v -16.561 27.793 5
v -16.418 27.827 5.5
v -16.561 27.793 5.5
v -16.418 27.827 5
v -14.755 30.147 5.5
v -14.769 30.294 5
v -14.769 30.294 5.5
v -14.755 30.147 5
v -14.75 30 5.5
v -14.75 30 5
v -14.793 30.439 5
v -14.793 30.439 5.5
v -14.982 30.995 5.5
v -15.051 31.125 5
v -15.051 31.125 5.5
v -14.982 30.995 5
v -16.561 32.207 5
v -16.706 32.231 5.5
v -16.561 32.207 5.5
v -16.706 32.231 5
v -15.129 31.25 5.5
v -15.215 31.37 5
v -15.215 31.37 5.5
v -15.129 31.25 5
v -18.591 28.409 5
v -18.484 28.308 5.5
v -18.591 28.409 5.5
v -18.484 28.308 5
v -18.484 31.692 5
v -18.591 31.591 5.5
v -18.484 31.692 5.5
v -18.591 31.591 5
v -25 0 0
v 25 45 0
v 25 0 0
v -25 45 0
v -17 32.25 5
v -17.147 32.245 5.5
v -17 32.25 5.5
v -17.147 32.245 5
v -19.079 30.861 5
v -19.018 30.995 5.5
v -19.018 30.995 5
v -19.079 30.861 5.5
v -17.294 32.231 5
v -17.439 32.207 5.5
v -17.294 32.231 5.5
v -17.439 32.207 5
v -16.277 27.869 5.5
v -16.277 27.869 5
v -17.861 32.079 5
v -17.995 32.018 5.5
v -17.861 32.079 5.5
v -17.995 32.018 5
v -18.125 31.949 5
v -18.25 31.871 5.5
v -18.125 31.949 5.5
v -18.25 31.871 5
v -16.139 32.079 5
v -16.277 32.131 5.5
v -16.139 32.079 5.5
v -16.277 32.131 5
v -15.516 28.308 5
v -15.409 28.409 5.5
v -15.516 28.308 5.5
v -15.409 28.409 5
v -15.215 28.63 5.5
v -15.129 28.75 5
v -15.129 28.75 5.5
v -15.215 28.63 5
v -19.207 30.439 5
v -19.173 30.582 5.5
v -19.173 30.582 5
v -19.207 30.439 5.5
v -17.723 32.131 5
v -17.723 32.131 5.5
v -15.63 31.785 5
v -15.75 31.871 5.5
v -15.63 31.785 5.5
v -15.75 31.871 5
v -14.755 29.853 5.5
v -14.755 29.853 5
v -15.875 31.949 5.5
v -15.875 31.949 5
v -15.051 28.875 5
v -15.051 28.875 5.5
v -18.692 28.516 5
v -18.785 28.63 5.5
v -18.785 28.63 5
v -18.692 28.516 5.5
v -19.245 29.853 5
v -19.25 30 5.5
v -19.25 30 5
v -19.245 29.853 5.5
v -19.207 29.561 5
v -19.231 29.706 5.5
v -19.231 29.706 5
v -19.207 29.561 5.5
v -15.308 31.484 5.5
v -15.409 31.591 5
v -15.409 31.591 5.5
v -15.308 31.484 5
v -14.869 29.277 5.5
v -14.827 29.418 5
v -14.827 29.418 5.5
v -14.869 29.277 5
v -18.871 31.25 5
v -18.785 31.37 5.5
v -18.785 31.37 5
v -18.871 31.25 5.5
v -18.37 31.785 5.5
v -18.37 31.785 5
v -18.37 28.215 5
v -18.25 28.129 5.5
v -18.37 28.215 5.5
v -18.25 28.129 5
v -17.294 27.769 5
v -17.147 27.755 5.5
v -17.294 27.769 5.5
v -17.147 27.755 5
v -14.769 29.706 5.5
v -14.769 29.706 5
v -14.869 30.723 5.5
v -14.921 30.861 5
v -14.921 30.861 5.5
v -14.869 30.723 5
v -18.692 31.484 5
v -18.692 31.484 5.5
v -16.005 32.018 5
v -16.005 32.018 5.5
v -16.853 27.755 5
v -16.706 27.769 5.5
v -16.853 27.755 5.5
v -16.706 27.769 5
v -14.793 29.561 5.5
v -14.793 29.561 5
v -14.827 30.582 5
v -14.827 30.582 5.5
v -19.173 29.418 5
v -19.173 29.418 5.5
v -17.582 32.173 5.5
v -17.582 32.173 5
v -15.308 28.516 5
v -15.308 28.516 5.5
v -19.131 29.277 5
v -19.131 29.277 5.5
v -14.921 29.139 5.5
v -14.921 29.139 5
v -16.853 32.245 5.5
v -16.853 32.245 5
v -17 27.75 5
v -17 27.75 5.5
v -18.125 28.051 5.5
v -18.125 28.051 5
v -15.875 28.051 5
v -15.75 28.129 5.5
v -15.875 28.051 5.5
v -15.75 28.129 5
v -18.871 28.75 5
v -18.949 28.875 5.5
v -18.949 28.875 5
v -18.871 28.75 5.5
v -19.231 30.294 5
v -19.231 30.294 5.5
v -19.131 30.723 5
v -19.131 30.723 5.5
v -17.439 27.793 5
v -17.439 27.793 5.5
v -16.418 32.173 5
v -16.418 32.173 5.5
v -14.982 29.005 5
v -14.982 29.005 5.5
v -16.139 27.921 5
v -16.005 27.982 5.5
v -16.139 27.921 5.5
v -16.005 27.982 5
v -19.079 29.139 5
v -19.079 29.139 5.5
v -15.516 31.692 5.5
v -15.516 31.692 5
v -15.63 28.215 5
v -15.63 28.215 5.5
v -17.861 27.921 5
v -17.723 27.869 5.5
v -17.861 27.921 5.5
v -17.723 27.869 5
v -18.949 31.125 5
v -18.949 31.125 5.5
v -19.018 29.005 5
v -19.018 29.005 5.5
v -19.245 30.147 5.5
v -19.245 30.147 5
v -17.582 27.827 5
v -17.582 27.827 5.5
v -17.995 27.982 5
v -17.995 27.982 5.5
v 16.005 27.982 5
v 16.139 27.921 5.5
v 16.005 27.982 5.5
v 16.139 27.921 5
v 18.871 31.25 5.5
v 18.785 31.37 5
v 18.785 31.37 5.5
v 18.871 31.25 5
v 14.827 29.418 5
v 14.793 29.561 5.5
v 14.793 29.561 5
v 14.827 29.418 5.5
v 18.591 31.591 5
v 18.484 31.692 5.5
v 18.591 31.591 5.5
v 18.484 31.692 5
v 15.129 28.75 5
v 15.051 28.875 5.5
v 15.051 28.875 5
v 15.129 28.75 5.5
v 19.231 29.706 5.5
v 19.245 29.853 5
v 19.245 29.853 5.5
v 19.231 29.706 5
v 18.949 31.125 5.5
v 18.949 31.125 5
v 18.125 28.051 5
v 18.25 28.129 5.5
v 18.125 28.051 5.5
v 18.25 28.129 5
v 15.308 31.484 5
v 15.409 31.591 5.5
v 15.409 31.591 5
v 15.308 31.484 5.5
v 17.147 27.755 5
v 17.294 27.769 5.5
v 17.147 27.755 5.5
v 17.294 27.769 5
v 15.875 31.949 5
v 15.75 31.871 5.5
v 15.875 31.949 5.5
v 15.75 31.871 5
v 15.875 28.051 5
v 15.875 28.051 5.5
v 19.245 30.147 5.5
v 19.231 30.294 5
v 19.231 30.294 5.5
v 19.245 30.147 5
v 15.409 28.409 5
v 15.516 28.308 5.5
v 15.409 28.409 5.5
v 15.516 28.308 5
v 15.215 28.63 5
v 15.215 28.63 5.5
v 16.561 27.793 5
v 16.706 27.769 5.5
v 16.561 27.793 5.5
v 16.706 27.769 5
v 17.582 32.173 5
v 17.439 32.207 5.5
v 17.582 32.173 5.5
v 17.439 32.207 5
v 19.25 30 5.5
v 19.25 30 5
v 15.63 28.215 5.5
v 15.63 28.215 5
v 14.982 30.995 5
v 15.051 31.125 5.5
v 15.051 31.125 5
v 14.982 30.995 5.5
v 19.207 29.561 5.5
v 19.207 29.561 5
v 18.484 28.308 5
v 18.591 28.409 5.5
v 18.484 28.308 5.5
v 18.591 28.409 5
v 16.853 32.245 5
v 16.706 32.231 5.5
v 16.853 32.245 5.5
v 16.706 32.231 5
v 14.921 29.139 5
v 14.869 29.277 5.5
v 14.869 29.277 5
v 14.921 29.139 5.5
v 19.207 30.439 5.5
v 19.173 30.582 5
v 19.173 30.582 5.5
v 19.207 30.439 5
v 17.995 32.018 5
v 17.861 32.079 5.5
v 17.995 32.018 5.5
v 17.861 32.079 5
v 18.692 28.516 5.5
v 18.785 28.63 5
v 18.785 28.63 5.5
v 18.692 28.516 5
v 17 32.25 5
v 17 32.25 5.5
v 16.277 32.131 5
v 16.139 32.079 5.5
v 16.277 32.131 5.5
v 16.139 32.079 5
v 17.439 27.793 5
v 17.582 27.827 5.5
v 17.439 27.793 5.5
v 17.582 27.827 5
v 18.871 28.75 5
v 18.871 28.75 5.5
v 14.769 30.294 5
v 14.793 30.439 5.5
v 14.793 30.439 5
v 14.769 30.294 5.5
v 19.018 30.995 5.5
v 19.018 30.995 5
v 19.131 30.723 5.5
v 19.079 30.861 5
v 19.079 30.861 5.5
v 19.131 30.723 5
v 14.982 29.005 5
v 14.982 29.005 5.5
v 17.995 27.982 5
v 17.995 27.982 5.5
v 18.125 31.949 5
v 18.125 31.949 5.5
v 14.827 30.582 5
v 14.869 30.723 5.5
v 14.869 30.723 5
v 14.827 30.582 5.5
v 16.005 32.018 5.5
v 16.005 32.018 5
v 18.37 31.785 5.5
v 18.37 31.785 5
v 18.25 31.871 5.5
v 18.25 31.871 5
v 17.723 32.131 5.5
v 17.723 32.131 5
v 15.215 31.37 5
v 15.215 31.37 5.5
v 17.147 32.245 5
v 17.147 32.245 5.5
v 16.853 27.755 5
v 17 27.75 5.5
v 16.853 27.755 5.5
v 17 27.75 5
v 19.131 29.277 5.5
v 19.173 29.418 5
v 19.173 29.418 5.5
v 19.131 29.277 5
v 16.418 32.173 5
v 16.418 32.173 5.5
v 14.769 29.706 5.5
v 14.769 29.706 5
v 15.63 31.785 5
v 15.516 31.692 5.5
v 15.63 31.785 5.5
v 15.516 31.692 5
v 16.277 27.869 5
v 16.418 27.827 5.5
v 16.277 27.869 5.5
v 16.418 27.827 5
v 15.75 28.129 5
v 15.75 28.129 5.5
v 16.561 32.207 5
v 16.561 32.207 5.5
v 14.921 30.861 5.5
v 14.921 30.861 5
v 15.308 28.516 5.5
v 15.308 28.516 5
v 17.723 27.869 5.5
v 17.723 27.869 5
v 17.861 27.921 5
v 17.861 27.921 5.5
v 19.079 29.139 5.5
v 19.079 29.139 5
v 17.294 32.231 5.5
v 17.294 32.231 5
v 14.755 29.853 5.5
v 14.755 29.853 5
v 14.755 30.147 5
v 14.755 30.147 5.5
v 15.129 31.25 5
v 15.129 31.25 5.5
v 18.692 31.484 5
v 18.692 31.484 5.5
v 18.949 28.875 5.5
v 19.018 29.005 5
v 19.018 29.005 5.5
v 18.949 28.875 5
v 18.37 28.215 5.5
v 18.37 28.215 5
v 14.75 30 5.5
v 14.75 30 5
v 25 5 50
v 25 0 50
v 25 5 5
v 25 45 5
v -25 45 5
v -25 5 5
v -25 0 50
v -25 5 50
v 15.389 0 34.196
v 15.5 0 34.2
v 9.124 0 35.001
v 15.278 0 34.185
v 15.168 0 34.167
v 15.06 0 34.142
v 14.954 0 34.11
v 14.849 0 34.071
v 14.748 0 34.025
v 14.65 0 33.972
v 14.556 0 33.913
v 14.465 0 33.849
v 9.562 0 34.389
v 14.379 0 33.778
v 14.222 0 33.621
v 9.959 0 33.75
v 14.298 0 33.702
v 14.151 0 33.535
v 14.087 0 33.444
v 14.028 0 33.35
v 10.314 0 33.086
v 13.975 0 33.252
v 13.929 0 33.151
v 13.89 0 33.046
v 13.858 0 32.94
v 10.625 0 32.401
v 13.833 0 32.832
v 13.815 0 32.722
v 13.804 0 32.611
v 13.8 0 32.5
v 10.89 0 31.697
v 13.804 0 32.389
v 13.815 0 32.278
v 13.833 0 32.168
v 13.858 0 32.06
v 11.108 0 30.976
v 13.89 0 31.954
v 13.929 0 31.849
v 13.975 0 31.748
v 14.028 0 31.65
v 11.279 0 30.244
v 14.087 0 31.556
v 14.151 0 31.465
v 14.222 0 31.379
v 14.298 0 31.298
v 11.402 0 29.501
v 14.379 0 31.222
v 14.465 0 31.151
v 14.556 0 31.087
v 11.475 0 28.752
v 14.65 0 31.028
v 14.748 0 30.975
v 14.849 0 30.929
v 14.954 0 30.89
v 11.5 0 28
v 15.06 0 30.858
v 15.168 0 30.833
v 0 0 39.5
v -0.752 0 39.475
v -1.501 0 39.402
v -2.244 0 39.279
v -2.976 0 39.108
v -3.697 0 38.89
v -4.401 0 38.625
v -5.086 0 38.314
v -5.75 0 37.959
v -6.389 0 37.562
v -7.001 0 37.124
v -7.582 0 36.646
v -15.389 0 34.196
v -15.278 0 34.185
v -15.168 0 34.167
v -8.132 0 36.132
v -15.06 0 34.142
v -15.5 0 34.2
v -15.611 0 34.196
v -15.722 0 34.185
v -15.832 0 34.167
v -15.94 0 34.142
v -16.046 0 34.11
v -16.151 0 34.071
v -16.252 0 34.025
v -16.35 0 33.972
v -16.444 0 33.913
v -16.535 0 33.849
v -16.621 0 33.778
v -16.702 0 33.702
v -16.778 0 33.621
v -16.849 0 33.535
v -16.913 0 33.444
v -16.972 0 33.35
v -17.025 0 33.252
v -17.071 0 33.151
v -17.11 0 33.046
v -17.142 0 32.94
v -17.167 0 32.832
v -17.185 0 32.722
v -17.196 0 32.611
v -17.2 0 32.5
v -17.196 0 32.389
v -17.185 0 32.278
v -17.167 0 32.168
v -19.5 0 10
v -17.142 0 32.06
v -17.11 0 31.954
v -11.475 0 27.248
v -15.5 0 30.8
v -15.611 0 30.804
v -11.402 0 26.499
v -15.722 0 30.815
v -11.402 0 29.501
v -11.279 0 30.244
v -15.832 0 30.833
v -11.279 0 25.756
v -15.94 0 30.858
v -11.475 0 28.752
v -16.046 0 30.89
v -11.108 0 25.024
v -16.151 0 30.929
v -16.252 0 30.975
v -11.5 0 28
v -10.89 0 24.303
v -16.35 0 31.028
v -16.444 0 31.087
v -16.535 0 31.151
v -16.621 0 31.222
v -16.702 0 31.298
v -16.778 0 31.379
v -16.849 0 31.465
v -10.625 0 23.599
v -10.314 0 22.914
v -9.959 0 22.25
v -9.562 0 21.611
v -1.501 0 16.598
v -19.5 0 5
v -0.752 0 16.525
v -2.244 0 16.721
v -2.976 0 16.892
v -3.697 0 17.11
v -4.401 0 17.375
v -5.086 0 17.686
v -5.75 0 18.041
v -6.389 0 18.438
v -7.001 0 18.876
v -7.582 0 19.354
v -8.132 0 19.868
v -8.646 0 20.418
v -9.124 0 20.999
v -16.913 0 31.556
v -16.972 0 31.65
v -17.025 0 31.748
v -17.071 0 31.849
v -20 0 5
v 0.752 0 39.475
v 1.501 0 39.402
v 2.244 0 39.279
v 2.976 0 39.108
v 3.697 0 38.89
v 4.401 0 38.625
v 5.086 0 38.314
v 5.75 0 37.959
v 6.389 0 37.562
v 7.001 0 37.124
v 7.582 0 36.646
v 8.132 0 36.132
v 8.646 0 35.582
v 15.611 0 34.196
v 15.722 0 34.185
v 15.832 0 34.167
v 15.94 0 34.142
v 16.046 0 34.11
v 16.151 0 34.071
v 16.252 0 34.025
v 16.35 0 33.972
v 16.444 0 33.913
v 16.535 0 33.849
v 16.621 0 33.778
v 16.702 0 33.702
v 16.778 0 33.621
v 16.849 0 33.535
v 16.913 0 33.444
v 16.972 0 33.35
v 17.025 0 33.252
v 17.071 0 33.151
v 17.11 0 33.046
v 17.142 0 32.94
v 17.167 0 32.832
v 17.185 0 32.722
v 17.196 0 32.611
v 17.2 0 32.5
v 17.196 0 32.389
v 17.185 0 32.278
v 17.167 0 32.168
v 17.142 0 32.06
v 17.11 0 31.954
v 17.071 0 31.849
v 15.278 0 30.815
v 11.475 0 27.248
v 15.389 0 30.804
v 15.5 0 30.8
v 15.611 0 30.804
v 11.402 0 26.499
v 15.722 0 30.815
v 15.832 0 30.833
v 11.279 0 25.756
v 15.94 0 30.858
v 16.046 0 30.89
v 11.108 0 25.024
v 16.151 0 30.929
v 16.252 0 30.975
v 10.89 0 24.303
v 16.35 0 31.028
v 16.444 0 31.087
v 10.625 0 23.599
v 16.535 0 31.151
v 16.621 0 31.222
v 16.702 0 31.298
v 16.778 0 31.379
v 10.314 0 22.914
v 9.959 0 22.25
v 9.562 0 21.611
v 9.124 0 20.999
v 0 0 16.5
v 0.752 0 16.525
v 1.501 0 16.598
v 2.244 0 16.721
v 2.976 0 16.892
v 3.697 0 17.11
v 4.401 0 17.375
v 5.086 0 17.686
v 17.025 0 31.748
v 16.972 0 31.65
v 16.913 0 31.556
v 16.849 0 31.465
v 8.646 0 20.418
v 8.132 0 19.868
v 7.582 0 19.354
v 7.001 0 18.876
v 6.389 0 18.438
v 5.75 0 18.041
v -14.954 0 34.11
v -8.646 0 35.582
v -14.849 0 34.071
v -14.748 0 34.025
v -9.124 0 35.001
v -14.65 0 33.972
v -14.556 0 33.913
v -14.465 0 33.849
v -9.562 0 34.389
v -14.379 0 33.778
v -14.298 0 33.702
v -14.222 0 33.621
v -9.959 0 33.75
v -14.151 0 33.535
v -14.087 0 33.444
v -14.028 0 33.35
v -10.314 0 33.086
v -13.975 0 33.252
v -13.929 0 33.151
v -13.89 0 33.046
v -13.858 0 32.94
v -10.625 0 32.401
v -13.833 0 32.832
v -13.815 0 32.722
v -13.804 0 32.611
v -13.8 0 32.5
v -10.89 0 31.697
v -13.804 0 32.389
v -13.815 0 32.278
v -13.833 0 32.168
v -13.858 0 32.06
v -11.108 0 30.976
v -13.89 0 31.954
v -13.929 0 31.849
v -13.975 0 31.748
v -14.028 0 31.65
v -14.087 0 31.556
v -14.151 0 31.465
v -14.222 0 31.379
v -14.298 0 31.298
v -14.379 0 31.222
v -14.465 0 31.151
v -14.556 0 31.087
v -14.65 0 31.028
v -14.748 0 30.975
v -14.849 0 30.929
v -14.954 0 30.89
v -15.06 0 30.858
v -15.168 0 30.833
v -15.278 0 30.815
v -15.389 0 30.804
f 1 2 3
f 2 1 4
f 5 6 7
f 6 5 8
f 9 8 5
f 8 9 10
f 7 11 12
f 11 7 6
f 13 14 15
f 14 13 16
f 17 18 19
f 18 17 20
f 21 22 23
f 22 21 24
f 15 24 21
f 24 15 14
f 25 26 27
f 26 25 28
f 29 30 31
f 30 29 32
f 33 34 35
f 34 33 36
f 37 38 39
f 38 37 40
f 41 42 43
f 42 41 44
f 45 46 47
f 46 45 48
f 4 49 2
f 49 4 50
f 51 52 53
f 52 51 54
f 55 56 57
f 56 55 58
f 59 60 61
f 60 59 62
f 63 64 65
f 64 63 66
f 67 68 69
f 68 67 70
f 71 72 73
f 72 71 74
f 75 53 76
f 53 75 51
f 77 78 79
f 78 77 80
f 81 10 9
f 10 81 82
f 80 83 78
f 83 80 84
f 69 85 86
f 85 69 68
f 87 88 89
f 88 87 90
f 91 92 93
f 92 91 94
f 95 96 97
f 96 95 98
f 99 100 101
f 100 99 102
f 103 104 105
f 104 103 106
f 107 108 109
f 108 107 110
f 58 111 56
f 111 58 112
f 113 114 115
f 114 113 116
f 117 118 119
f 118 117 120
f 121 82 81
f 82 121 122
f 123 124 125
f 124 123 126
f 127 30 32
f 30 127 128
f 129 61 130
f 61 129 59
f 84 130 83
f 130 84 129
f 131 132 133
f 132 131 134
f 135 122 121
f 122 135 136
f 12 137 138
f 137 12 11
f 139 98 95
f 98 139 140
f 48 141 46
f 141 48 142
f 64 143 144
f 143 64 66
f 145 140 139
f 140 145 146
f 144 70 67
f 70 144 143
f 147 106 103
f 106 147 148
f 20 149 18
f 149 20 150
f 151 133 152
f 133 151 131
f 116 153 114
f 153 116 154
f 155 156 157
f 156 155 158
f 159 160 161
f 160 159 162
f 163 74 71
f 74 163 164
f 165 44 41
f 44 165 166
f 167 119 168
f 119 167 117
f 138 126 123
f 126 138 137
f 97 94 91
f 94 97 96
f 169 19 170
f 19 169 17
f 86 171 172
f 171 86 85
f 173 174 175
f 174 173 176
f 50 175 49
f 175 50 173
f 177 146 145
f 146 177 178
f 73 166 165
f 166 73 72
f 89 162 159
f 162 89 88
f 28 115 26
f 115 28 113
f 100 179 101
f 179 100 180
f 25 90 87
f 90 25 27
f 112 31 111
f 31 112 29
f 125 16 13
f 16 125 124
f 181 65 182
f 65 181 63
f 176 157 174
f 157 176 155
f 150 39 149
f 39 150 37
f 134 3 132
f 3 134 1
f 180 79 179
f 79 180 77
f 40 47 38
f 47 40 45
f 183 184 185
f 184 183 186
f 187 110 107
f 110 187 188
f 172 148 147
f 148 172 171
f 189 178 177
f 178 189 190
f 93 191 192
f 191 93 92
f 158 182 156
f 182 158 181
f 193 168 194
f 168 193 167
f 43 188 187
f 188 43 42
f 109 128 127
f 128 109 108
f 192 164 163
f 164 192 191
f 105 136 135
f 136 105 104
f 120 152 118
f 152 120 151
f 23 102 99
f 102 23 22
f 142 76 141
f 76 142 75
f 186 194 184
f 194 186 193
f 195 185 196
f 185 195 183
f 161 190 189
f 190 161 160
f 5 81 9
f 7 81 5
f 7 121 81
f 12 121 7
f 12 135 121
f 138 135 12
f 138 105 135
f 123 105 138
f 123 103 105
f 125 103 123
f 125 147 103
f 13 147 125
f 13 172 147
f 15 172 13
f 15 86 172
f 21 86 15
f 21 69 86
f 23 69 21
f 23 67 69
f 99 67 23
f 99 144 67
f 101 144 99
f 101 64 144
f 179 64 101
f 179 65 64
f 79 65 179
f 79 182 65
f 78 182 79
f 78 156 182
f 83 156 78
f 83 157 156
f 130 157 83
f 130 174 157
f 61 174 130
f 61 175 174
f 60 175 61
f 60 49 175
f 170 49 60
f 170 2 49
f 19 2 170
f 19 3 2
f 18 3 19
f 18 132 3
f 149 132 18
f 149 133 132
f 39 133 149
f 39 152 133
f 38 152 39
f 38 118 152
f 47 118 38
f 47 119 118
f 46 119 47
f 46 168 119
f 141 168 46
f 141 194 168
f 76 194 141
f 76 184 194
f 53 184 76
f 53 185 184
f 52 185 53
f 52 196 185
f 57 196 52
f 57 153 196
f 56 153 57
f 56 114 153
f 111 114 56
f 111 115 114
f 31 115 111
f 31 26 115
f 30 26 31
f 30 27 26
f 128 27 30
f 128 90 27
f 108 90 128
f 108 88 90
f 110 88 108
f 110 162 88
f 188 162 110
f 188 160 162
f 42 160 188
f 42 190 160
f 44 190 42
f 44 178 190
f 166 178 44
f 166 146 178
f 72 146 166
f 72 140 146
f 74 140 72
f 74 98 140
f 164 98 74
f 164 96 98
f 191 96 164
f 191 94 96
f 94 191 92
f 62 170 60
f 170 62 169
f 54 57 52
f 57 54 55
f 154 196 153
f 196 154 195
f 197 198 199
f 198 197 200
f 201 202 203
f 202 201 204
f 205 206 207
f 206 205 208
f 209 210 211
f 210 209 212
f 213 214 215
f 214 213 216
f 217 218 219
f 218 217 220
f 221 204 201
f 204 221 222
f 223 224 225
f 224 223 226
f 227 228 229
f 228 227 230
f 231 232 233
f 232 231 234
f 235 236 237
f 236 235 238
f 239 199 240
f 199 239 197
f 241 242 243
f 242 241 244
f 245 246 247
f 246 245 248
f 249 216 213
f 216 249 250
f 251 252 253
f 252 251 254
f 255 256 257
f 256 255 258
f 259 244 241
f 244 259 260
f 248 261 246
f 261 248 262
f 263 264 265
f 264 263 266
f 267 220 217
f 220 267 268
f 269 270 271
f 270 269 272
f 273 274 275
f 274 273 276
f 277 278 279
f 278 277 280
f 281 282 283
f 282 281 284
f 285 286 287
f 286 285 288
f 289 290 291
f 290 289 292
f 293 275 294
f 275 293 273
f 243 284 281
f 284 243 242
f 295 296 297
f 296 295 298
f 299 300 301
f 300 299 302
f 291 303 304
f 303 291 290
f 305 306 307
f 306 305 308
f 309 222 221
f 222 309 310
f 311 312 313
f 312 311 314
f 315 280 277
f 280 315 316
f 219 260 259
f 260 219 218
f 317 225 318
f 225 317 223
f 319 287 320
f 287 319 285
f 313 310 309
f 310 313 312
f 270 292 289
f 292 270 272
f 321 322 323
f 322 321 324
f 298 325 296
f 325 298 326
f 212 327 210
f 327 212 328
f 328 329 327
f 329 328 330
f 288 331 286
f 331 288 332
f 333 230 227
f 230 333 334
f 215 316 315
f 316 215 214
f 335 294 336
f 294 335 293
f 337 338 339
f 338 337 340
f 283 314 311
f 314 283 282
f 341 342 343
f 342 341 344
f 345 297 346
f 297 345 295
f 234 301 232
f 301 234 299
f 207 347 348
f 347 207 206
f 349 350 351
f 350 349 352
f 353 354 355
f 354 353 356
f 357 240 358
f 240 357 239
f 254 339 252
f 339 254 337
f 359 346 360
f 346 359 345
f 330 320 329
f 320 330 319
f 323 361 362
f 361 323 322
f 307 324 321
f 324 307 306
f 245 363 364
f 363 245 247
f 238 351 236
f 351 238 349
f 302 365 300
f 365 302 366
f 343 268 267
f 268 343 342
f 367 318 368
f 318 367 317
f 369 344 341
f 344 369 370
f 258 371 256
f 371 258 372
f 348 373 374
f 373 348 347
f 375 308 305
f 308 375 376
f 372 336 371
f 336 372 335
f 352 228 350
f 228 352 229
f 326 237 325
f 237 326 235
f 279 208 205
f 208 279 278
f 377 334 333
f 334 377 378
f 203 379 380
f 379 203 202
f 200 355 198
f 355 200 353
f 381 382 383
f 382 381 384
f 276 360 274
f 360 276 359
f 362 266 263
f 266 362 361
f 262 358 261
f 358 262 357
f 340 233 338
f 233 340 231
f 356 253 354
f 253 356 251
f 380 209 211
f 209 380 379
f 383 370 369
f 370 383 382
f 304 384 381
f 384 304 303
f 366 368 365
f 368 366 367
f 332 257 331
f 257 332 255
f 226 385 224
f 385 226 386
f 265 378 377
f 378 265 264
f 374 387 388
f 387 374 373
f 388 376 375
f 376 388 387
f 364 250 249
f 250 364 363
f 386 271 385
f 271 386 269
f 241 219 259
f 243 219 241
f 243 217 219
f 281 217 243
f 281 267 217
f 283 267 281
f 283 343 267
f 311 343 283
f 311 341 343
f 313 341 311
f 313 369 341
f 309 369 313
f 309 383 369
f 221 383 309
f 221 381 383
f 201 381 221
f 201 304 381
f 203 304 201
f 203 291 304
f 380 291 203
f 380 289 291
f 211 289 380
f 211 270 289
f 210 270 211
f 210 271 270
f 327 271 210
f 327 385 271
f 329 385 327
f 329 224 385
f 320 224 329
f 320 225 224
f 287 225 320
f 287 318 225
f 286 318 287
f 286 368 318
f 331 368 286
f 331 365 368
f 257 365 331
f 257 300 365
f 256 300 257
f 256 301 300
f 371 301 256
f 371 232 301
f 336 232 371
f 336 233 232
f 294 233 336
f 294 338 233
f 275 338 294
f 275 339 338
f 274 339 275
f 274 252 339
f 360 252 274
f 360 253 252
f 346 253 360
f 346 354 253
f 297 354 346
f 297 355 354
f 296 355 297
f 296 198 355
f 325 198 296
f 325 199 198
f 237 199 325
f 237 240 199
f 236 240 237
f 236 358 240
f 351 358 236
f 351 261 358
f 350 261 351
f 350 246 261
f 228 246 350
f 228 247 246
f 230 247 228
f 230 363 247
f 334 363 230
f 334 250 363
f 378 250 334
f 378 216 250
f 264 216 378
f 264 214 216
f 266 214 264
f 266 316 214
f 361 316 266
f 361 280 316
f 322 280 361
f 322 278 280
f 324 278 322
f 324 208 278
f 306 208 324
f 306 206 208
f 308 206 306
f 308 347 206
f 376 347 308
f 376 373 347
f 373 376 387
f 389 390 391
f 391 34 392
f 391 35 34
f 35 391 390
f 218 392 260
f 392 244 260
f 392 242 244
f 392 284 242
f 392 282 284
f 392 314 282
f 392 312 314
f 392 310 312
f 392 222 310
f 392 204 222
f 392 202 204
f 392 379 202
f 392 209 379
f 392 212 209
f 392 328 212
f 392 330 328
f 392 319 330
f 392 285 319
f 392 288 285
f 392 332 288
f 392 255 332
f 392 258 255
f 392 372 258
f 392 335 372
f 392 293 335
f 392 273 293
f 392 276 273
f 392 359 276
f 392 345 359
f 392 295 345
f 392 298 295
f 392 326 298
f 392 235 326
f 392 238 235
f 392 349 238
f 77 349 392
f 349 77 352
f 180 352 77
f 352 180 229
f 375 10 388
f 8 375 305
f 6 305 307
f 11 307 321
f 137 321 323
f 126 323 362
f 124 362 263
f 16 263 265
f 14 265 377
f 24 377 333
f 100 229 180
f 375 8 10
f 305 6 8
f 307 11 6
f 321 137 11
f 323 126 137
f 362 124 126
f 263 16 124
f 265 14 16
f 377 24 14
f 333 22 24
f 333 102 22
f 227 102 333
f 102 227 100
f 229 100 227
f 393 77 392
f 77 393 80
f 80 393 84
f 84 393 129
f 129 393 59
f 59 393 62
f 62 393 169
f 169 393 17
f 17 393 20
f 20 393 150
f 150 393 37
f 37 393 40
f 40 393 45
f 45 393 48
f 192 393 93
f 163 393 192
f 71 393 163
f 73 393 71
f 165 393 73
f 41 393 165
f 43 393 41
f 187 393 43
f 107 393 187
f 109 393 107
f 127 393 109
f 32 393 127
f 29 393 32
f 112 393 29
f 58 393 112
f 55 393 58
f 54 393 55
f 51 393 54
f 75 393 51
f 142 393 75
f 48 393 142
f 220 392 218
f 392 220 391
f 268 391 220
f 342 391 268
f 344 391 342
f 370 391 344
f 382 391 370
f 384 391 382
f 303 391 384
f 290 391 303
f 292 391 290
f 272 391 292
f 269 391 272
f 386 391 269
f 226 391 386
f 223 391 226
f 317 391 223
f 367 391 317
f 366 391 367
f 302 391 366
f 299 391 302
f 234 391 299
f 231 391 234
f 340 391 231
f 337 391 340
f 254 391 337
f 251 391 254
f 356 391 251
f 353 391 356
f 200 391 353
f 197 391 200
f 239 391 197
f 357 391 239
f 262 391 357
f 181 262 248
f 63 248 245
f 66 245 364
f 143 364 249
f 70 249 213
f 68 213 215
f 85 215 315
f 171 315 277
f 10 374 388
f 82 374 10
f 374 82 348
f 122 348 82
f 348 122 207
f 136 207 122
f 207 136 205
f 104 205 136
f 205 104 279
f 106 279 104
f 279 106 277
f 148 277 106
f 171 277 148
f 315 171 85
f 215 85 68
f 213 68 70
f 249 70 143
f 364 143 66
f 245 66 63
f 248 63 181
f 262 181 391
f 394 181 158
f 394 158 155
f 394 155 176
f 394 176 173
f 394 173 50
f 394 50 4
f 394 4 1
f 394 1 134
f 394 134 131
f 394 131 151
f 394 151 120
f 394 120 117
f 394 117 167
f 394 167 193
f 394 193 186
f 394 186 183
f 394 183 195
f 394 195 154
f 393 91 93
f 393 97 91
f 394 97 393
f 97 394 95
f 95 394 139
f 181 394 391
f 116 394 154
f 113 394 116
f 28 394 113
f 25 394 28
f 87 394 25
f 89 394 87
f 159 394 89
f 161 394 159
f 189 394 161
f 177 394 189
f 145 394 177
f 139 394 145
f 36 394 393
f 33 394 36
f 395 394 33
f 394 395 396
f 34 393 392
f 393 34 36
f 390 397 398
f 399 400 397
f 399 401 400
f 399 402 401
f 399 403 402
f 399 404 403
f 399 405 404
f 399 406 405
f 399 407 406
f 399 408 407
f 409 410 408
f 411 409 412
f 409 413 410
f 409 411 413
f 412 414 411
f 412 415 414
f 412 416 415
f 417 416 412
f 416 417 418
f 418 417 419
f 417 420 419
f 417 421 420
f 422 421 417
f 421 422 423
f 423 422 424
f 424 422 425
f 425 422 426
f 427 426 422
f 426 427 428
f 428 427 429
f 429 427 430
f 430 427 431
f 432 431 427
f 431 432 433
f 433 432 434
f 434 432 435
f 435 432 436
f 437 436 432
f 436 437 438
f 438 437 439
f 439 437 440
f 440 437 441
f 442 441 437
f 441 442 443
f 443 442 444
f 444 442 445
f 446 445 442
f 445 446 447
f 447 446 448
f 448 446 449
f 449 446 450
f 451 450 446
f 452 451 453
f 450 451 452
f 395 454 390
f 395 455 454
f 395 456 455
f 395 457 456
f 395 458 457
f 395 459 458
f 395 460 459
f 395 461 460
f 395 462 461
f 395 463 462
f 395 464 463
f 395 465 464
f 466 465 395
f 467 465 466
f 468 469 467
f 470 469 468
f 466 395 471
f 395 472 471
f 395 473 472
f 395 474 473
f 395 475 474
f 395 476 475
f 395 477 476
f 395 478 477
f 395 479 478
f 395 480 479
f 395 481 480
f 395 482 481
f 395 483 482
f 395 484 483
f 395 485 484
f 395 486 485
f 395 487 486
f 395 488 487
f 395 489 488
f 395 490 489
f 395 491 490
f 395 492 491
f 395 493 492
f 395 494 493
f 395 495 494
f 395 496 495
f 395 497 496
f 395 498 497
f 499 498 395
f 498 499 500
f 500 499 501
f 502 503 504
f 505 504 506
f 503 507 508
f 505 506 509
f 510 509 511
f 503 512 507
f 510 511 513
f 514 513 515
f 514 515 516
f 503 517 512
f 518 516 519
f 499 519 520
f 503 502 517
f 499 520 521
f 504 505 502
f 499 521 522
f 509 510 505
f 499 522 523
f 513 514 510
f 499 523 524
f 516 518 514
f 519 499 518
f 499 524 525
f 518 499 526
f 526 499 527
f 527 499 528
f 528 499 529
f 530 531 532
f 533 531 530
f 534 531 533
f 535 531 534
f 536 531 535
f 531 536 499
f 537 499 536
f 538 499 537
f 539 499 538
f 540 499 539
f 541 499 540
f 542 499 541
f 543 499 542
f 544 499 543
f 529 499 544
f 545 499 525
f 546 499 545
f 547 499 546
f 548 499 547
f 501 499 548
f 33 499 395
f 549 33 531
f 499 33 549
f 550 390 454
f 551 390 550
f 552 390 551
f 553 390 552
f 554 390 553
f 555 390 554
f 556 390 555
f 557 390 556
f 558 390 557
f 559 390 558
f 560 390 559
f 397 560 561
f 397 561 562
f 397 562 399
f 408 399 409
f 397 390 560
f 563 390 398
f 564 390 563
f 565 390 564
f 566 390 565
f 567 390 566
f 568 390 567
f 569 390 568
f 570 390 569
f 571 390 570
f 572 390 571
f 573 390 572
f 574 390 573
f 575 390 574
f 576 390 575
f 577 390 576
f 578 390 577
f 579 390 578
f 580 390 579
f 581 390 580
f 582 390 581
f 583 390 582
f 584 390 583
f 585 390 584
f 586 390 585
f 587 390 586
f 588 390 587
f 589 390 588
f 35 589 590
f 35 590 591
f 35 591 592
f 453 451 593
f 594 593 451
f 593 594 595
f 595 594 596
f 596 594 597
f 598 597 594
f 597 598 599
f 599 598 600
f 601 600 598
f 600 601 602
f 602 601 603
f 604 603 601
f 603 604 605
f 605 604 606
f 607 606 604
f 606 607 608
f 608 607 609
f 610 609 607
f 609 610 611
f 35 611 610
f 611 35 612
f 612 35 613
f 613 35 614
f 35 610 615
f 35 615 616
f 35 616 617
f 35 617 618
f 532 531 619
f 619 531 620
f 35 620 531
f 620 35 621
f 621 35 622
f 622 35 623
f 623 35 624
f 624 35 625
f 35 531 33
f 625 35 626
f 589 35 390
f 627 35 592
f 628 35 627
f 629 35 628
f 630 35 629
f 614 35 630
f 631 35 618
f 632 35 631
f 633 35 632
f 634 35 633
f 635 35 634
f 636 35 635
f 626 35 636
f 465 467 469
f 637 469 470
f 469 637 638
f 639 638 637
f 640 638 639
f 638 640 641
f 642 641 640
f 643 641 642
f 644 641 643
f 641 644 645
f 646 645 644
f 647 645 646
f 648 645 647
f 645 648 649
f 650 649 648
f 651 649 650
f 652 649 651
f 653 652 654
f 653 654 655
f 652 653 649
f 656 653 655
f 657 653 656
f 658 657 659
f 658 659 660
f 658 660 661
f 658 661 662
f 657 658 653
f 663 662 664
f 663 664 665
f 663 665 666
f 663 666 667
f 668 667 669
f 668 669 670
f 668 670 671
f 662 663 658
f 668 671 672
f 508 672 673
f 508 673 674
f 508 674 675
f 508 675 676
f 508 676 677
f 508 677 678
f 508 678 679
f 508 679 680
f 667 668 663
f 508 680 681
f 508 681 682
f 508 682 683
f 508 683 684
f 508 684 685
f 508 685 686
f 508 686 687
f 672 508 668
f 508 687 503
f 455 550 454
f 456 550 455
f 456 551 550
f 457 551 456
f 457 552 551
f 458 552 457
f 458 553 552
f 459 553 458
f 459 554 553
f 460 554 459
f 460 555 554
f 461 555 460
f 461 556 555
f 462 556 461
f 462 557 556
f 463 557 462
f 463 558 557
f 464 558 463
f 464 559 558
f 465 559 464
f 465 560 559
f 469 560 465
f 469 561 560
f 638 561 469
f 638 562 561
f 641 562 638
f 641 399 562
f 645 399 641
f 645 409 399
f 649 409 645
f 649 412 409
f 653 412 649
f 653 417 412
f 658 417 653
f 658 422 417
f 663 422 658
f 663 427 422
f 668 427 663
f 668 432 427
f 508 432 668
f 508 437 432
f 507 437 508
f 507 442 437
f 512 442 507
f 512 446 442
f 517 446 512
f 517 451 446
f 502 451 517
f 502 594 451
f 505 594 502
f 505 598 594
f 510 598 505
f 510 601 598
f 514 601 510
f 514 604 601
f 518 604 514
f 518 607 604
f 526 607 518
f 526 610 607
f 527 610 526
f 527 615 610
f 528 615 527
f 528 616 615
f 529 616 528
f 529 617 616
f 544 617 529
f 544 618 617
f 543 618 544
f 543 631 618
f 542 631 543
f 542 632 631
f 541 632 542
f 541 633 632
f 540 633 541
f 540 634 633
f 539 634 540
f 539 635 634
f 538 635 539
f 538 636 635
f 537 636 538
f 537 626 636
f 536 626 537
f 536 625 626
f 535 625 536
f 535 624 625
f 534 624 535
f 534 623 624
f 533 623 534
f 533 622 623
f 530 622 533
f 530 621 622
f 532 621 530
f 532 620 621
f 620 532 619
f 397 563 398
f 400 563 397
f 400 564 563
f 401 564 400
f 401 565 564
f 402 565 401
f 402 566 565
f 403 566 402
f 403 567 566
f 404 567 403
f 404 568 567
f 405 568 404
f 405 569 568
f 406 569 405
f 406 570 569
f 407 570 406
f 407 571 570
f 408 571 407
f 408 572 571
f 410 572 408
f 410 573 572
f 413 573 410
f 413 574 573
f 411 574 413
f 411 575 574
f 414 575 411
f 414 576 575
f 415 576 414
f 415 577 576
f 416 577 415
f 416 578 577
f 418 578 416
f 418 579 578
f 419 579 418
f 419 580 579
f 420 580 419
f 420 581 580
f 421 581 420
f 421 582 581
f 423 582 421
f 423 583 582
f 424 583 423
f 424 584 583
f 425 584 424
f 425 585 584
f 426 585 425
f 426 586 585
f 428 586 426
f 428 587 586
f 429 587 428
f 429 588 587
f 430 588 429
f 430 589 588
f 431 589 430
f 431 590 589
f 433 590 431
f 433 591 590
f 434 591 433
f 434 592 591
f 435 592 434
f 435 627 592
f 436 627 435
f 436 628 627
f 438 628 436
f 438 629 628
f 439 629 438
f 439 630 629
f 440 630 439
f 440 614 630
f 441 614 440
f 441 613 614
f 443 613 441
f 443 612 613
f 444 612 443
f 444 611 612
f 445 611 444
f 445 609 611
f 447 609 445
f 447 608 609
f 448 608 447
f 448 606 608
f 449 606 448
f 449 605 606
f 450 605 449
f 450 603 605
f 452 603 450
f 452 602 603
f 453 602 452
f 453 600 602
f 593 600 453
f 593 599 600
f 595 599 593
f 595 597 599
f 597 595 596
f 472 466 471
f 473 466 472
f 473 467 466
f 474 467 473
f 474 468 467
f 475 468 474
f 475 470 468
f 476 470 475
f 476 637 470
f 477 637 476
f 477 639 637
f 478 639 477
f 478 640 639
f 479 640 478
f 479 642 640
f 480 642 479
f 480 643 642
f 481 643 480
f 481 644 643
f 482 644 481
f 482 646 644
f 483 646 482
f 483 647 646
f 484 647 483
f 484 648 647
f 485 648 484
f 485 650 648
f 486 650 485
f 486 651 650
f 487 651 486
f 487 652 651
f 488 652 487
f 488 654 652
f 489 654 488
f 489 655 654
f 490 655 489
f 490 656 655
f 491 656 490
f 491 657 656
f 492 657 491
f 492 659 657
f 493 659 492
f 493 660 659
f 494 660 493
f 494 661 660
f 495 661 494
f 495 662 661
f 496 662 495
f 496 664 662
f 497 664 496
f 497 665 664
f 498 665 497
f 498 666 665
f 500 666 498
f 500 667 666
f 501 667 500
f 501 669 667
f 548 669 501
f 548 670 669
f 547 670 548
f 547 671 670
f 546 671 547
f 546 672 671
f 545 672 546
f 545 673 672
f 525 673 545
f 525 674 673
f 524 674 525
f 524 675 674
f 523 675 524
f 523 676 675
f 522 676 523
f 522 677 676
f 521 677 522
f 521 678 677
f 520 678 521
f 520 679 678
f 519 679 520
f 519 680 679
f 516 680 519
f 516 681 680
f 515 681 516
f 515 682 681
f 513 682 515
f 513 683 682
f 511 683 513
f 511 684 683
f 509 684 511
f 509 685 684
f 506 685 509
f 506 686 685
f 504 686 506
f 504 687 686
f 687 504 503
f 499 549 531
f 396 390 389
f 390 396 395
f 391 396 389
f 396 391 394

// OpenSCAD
// L-shaped mounting bracket for a NEMA 17 stepper motor, e.g. for a syringe pump.
// Print orientation: the base plate lies on the bed.
//
// Specification:
//   Base plate: x from -25 to 25, y from 0 to 45, z from 0 to 5.
//   Two M4 vertical through-holes at (x = -17, y = 30) and (x = 17, y = 30).
//   Vertical motor plate: x from -25 to 25, y from 0 to 5, z from 0 to 50,
//   standing on the back edge of the base.
//   A 23 mm hole for the motor's centring boss runs along Y through the motor plate,
//   centred at x = 0, z = 28.
//   Four M3 screw holes on a 31 mm square pattern centred on the boss hole.
//   Two triangular gussets, 5 mm thick, flush with the left and right edges
//   (x = -25 to -20 and x = 20 to 25). Each gusset is a right triangle in the YZ plane,
//   with legs 20 mm along +Y and 20 mm along +Z, its right-angle corner at y = 5, z = 5
//   (where the plates meet).

// ---- Base plate ----
base_x = 25;       // plate spans x = -25 to 25
base_y = 45;       // plate spans y = 0 to 45
base_z = 5;        // plate thickness

// ---- Motor plate ----
motor_x = 25;      // plate spans x = -25 to 25
motor_y = 5;       // plate spans y = 0 to 5
motor_z = 50;      // plate height (z = 0 to 50)

// ---- Boss hole ----
boss_d = 23;       // motor centring boss hole diameter
boss_x = 0;        // hole centre x
boss_z = 28;       // hole centre z

// ---- Screw holes ----
screw_d = 3.4;     // M3 screw hole diameter
screw_p = 31;      // square pattern side length
screw_h = 4.5;     // screw hole depth

// ---- Gussets ----
gusset_t = 5;      // gusset thickness (along X)
gusset_y = 5;      // gusset leg length along Y
gusset_z = 5;      // gusset leg length along Z
gusset_x = -20;    // left gusset spans x = -25 to -20

// ---- Misc ----
eps = 0.5;         // cutter overshoot past faces
$fn = 96;          // curve resolution

difference() {
    union() {
        // Base plate with M4 through-holes
        translate([-base_x, 0, 0])
            cube([base_x - (-base_x), base_y, base_z]);
        for (sx = [-17, 17])
            translate([sx, 30, 0])
                cylinder(d = 4.5, h = base_z + eps);

        // Vertical motor plate
        translate([-motor_x, 0, 0])
            cube([motor_x - (-motor_x), motor_y, motor_z]);
    }

    // Boss hole cut along Y
    translate([boss_x, 0, boss_z])
        rotate([90, 0, 0])
            cylinder(d = boss_d, h = motor_y + 2 * eps);

    // M3 screw holes on square pattern centred on boss hole
    for (i = [0 : 3]) {
        r = screw_p / 2;
        a = i * 90;
        translate([boss_x + r * cos(a), 0, boss_z + screw_h])
            rotate([90, 0, 0])
                cylinder(d = screw_d, h = motor_y + eps);
    }

    // Gussets flush with left and right edges
    for (sx = [-25, 25])
        translate([sx, 0, 0])
            rotate([90, 0, 0])
                linear_extrude(height = gusset_t)
                    polygon(points = [
                        [gusset_y, gusset_z],
                        [gusset_y + eps, gusset_z],
                        [gusset_y + eps, gusset_z + gusset_z]
                    ]);
}
